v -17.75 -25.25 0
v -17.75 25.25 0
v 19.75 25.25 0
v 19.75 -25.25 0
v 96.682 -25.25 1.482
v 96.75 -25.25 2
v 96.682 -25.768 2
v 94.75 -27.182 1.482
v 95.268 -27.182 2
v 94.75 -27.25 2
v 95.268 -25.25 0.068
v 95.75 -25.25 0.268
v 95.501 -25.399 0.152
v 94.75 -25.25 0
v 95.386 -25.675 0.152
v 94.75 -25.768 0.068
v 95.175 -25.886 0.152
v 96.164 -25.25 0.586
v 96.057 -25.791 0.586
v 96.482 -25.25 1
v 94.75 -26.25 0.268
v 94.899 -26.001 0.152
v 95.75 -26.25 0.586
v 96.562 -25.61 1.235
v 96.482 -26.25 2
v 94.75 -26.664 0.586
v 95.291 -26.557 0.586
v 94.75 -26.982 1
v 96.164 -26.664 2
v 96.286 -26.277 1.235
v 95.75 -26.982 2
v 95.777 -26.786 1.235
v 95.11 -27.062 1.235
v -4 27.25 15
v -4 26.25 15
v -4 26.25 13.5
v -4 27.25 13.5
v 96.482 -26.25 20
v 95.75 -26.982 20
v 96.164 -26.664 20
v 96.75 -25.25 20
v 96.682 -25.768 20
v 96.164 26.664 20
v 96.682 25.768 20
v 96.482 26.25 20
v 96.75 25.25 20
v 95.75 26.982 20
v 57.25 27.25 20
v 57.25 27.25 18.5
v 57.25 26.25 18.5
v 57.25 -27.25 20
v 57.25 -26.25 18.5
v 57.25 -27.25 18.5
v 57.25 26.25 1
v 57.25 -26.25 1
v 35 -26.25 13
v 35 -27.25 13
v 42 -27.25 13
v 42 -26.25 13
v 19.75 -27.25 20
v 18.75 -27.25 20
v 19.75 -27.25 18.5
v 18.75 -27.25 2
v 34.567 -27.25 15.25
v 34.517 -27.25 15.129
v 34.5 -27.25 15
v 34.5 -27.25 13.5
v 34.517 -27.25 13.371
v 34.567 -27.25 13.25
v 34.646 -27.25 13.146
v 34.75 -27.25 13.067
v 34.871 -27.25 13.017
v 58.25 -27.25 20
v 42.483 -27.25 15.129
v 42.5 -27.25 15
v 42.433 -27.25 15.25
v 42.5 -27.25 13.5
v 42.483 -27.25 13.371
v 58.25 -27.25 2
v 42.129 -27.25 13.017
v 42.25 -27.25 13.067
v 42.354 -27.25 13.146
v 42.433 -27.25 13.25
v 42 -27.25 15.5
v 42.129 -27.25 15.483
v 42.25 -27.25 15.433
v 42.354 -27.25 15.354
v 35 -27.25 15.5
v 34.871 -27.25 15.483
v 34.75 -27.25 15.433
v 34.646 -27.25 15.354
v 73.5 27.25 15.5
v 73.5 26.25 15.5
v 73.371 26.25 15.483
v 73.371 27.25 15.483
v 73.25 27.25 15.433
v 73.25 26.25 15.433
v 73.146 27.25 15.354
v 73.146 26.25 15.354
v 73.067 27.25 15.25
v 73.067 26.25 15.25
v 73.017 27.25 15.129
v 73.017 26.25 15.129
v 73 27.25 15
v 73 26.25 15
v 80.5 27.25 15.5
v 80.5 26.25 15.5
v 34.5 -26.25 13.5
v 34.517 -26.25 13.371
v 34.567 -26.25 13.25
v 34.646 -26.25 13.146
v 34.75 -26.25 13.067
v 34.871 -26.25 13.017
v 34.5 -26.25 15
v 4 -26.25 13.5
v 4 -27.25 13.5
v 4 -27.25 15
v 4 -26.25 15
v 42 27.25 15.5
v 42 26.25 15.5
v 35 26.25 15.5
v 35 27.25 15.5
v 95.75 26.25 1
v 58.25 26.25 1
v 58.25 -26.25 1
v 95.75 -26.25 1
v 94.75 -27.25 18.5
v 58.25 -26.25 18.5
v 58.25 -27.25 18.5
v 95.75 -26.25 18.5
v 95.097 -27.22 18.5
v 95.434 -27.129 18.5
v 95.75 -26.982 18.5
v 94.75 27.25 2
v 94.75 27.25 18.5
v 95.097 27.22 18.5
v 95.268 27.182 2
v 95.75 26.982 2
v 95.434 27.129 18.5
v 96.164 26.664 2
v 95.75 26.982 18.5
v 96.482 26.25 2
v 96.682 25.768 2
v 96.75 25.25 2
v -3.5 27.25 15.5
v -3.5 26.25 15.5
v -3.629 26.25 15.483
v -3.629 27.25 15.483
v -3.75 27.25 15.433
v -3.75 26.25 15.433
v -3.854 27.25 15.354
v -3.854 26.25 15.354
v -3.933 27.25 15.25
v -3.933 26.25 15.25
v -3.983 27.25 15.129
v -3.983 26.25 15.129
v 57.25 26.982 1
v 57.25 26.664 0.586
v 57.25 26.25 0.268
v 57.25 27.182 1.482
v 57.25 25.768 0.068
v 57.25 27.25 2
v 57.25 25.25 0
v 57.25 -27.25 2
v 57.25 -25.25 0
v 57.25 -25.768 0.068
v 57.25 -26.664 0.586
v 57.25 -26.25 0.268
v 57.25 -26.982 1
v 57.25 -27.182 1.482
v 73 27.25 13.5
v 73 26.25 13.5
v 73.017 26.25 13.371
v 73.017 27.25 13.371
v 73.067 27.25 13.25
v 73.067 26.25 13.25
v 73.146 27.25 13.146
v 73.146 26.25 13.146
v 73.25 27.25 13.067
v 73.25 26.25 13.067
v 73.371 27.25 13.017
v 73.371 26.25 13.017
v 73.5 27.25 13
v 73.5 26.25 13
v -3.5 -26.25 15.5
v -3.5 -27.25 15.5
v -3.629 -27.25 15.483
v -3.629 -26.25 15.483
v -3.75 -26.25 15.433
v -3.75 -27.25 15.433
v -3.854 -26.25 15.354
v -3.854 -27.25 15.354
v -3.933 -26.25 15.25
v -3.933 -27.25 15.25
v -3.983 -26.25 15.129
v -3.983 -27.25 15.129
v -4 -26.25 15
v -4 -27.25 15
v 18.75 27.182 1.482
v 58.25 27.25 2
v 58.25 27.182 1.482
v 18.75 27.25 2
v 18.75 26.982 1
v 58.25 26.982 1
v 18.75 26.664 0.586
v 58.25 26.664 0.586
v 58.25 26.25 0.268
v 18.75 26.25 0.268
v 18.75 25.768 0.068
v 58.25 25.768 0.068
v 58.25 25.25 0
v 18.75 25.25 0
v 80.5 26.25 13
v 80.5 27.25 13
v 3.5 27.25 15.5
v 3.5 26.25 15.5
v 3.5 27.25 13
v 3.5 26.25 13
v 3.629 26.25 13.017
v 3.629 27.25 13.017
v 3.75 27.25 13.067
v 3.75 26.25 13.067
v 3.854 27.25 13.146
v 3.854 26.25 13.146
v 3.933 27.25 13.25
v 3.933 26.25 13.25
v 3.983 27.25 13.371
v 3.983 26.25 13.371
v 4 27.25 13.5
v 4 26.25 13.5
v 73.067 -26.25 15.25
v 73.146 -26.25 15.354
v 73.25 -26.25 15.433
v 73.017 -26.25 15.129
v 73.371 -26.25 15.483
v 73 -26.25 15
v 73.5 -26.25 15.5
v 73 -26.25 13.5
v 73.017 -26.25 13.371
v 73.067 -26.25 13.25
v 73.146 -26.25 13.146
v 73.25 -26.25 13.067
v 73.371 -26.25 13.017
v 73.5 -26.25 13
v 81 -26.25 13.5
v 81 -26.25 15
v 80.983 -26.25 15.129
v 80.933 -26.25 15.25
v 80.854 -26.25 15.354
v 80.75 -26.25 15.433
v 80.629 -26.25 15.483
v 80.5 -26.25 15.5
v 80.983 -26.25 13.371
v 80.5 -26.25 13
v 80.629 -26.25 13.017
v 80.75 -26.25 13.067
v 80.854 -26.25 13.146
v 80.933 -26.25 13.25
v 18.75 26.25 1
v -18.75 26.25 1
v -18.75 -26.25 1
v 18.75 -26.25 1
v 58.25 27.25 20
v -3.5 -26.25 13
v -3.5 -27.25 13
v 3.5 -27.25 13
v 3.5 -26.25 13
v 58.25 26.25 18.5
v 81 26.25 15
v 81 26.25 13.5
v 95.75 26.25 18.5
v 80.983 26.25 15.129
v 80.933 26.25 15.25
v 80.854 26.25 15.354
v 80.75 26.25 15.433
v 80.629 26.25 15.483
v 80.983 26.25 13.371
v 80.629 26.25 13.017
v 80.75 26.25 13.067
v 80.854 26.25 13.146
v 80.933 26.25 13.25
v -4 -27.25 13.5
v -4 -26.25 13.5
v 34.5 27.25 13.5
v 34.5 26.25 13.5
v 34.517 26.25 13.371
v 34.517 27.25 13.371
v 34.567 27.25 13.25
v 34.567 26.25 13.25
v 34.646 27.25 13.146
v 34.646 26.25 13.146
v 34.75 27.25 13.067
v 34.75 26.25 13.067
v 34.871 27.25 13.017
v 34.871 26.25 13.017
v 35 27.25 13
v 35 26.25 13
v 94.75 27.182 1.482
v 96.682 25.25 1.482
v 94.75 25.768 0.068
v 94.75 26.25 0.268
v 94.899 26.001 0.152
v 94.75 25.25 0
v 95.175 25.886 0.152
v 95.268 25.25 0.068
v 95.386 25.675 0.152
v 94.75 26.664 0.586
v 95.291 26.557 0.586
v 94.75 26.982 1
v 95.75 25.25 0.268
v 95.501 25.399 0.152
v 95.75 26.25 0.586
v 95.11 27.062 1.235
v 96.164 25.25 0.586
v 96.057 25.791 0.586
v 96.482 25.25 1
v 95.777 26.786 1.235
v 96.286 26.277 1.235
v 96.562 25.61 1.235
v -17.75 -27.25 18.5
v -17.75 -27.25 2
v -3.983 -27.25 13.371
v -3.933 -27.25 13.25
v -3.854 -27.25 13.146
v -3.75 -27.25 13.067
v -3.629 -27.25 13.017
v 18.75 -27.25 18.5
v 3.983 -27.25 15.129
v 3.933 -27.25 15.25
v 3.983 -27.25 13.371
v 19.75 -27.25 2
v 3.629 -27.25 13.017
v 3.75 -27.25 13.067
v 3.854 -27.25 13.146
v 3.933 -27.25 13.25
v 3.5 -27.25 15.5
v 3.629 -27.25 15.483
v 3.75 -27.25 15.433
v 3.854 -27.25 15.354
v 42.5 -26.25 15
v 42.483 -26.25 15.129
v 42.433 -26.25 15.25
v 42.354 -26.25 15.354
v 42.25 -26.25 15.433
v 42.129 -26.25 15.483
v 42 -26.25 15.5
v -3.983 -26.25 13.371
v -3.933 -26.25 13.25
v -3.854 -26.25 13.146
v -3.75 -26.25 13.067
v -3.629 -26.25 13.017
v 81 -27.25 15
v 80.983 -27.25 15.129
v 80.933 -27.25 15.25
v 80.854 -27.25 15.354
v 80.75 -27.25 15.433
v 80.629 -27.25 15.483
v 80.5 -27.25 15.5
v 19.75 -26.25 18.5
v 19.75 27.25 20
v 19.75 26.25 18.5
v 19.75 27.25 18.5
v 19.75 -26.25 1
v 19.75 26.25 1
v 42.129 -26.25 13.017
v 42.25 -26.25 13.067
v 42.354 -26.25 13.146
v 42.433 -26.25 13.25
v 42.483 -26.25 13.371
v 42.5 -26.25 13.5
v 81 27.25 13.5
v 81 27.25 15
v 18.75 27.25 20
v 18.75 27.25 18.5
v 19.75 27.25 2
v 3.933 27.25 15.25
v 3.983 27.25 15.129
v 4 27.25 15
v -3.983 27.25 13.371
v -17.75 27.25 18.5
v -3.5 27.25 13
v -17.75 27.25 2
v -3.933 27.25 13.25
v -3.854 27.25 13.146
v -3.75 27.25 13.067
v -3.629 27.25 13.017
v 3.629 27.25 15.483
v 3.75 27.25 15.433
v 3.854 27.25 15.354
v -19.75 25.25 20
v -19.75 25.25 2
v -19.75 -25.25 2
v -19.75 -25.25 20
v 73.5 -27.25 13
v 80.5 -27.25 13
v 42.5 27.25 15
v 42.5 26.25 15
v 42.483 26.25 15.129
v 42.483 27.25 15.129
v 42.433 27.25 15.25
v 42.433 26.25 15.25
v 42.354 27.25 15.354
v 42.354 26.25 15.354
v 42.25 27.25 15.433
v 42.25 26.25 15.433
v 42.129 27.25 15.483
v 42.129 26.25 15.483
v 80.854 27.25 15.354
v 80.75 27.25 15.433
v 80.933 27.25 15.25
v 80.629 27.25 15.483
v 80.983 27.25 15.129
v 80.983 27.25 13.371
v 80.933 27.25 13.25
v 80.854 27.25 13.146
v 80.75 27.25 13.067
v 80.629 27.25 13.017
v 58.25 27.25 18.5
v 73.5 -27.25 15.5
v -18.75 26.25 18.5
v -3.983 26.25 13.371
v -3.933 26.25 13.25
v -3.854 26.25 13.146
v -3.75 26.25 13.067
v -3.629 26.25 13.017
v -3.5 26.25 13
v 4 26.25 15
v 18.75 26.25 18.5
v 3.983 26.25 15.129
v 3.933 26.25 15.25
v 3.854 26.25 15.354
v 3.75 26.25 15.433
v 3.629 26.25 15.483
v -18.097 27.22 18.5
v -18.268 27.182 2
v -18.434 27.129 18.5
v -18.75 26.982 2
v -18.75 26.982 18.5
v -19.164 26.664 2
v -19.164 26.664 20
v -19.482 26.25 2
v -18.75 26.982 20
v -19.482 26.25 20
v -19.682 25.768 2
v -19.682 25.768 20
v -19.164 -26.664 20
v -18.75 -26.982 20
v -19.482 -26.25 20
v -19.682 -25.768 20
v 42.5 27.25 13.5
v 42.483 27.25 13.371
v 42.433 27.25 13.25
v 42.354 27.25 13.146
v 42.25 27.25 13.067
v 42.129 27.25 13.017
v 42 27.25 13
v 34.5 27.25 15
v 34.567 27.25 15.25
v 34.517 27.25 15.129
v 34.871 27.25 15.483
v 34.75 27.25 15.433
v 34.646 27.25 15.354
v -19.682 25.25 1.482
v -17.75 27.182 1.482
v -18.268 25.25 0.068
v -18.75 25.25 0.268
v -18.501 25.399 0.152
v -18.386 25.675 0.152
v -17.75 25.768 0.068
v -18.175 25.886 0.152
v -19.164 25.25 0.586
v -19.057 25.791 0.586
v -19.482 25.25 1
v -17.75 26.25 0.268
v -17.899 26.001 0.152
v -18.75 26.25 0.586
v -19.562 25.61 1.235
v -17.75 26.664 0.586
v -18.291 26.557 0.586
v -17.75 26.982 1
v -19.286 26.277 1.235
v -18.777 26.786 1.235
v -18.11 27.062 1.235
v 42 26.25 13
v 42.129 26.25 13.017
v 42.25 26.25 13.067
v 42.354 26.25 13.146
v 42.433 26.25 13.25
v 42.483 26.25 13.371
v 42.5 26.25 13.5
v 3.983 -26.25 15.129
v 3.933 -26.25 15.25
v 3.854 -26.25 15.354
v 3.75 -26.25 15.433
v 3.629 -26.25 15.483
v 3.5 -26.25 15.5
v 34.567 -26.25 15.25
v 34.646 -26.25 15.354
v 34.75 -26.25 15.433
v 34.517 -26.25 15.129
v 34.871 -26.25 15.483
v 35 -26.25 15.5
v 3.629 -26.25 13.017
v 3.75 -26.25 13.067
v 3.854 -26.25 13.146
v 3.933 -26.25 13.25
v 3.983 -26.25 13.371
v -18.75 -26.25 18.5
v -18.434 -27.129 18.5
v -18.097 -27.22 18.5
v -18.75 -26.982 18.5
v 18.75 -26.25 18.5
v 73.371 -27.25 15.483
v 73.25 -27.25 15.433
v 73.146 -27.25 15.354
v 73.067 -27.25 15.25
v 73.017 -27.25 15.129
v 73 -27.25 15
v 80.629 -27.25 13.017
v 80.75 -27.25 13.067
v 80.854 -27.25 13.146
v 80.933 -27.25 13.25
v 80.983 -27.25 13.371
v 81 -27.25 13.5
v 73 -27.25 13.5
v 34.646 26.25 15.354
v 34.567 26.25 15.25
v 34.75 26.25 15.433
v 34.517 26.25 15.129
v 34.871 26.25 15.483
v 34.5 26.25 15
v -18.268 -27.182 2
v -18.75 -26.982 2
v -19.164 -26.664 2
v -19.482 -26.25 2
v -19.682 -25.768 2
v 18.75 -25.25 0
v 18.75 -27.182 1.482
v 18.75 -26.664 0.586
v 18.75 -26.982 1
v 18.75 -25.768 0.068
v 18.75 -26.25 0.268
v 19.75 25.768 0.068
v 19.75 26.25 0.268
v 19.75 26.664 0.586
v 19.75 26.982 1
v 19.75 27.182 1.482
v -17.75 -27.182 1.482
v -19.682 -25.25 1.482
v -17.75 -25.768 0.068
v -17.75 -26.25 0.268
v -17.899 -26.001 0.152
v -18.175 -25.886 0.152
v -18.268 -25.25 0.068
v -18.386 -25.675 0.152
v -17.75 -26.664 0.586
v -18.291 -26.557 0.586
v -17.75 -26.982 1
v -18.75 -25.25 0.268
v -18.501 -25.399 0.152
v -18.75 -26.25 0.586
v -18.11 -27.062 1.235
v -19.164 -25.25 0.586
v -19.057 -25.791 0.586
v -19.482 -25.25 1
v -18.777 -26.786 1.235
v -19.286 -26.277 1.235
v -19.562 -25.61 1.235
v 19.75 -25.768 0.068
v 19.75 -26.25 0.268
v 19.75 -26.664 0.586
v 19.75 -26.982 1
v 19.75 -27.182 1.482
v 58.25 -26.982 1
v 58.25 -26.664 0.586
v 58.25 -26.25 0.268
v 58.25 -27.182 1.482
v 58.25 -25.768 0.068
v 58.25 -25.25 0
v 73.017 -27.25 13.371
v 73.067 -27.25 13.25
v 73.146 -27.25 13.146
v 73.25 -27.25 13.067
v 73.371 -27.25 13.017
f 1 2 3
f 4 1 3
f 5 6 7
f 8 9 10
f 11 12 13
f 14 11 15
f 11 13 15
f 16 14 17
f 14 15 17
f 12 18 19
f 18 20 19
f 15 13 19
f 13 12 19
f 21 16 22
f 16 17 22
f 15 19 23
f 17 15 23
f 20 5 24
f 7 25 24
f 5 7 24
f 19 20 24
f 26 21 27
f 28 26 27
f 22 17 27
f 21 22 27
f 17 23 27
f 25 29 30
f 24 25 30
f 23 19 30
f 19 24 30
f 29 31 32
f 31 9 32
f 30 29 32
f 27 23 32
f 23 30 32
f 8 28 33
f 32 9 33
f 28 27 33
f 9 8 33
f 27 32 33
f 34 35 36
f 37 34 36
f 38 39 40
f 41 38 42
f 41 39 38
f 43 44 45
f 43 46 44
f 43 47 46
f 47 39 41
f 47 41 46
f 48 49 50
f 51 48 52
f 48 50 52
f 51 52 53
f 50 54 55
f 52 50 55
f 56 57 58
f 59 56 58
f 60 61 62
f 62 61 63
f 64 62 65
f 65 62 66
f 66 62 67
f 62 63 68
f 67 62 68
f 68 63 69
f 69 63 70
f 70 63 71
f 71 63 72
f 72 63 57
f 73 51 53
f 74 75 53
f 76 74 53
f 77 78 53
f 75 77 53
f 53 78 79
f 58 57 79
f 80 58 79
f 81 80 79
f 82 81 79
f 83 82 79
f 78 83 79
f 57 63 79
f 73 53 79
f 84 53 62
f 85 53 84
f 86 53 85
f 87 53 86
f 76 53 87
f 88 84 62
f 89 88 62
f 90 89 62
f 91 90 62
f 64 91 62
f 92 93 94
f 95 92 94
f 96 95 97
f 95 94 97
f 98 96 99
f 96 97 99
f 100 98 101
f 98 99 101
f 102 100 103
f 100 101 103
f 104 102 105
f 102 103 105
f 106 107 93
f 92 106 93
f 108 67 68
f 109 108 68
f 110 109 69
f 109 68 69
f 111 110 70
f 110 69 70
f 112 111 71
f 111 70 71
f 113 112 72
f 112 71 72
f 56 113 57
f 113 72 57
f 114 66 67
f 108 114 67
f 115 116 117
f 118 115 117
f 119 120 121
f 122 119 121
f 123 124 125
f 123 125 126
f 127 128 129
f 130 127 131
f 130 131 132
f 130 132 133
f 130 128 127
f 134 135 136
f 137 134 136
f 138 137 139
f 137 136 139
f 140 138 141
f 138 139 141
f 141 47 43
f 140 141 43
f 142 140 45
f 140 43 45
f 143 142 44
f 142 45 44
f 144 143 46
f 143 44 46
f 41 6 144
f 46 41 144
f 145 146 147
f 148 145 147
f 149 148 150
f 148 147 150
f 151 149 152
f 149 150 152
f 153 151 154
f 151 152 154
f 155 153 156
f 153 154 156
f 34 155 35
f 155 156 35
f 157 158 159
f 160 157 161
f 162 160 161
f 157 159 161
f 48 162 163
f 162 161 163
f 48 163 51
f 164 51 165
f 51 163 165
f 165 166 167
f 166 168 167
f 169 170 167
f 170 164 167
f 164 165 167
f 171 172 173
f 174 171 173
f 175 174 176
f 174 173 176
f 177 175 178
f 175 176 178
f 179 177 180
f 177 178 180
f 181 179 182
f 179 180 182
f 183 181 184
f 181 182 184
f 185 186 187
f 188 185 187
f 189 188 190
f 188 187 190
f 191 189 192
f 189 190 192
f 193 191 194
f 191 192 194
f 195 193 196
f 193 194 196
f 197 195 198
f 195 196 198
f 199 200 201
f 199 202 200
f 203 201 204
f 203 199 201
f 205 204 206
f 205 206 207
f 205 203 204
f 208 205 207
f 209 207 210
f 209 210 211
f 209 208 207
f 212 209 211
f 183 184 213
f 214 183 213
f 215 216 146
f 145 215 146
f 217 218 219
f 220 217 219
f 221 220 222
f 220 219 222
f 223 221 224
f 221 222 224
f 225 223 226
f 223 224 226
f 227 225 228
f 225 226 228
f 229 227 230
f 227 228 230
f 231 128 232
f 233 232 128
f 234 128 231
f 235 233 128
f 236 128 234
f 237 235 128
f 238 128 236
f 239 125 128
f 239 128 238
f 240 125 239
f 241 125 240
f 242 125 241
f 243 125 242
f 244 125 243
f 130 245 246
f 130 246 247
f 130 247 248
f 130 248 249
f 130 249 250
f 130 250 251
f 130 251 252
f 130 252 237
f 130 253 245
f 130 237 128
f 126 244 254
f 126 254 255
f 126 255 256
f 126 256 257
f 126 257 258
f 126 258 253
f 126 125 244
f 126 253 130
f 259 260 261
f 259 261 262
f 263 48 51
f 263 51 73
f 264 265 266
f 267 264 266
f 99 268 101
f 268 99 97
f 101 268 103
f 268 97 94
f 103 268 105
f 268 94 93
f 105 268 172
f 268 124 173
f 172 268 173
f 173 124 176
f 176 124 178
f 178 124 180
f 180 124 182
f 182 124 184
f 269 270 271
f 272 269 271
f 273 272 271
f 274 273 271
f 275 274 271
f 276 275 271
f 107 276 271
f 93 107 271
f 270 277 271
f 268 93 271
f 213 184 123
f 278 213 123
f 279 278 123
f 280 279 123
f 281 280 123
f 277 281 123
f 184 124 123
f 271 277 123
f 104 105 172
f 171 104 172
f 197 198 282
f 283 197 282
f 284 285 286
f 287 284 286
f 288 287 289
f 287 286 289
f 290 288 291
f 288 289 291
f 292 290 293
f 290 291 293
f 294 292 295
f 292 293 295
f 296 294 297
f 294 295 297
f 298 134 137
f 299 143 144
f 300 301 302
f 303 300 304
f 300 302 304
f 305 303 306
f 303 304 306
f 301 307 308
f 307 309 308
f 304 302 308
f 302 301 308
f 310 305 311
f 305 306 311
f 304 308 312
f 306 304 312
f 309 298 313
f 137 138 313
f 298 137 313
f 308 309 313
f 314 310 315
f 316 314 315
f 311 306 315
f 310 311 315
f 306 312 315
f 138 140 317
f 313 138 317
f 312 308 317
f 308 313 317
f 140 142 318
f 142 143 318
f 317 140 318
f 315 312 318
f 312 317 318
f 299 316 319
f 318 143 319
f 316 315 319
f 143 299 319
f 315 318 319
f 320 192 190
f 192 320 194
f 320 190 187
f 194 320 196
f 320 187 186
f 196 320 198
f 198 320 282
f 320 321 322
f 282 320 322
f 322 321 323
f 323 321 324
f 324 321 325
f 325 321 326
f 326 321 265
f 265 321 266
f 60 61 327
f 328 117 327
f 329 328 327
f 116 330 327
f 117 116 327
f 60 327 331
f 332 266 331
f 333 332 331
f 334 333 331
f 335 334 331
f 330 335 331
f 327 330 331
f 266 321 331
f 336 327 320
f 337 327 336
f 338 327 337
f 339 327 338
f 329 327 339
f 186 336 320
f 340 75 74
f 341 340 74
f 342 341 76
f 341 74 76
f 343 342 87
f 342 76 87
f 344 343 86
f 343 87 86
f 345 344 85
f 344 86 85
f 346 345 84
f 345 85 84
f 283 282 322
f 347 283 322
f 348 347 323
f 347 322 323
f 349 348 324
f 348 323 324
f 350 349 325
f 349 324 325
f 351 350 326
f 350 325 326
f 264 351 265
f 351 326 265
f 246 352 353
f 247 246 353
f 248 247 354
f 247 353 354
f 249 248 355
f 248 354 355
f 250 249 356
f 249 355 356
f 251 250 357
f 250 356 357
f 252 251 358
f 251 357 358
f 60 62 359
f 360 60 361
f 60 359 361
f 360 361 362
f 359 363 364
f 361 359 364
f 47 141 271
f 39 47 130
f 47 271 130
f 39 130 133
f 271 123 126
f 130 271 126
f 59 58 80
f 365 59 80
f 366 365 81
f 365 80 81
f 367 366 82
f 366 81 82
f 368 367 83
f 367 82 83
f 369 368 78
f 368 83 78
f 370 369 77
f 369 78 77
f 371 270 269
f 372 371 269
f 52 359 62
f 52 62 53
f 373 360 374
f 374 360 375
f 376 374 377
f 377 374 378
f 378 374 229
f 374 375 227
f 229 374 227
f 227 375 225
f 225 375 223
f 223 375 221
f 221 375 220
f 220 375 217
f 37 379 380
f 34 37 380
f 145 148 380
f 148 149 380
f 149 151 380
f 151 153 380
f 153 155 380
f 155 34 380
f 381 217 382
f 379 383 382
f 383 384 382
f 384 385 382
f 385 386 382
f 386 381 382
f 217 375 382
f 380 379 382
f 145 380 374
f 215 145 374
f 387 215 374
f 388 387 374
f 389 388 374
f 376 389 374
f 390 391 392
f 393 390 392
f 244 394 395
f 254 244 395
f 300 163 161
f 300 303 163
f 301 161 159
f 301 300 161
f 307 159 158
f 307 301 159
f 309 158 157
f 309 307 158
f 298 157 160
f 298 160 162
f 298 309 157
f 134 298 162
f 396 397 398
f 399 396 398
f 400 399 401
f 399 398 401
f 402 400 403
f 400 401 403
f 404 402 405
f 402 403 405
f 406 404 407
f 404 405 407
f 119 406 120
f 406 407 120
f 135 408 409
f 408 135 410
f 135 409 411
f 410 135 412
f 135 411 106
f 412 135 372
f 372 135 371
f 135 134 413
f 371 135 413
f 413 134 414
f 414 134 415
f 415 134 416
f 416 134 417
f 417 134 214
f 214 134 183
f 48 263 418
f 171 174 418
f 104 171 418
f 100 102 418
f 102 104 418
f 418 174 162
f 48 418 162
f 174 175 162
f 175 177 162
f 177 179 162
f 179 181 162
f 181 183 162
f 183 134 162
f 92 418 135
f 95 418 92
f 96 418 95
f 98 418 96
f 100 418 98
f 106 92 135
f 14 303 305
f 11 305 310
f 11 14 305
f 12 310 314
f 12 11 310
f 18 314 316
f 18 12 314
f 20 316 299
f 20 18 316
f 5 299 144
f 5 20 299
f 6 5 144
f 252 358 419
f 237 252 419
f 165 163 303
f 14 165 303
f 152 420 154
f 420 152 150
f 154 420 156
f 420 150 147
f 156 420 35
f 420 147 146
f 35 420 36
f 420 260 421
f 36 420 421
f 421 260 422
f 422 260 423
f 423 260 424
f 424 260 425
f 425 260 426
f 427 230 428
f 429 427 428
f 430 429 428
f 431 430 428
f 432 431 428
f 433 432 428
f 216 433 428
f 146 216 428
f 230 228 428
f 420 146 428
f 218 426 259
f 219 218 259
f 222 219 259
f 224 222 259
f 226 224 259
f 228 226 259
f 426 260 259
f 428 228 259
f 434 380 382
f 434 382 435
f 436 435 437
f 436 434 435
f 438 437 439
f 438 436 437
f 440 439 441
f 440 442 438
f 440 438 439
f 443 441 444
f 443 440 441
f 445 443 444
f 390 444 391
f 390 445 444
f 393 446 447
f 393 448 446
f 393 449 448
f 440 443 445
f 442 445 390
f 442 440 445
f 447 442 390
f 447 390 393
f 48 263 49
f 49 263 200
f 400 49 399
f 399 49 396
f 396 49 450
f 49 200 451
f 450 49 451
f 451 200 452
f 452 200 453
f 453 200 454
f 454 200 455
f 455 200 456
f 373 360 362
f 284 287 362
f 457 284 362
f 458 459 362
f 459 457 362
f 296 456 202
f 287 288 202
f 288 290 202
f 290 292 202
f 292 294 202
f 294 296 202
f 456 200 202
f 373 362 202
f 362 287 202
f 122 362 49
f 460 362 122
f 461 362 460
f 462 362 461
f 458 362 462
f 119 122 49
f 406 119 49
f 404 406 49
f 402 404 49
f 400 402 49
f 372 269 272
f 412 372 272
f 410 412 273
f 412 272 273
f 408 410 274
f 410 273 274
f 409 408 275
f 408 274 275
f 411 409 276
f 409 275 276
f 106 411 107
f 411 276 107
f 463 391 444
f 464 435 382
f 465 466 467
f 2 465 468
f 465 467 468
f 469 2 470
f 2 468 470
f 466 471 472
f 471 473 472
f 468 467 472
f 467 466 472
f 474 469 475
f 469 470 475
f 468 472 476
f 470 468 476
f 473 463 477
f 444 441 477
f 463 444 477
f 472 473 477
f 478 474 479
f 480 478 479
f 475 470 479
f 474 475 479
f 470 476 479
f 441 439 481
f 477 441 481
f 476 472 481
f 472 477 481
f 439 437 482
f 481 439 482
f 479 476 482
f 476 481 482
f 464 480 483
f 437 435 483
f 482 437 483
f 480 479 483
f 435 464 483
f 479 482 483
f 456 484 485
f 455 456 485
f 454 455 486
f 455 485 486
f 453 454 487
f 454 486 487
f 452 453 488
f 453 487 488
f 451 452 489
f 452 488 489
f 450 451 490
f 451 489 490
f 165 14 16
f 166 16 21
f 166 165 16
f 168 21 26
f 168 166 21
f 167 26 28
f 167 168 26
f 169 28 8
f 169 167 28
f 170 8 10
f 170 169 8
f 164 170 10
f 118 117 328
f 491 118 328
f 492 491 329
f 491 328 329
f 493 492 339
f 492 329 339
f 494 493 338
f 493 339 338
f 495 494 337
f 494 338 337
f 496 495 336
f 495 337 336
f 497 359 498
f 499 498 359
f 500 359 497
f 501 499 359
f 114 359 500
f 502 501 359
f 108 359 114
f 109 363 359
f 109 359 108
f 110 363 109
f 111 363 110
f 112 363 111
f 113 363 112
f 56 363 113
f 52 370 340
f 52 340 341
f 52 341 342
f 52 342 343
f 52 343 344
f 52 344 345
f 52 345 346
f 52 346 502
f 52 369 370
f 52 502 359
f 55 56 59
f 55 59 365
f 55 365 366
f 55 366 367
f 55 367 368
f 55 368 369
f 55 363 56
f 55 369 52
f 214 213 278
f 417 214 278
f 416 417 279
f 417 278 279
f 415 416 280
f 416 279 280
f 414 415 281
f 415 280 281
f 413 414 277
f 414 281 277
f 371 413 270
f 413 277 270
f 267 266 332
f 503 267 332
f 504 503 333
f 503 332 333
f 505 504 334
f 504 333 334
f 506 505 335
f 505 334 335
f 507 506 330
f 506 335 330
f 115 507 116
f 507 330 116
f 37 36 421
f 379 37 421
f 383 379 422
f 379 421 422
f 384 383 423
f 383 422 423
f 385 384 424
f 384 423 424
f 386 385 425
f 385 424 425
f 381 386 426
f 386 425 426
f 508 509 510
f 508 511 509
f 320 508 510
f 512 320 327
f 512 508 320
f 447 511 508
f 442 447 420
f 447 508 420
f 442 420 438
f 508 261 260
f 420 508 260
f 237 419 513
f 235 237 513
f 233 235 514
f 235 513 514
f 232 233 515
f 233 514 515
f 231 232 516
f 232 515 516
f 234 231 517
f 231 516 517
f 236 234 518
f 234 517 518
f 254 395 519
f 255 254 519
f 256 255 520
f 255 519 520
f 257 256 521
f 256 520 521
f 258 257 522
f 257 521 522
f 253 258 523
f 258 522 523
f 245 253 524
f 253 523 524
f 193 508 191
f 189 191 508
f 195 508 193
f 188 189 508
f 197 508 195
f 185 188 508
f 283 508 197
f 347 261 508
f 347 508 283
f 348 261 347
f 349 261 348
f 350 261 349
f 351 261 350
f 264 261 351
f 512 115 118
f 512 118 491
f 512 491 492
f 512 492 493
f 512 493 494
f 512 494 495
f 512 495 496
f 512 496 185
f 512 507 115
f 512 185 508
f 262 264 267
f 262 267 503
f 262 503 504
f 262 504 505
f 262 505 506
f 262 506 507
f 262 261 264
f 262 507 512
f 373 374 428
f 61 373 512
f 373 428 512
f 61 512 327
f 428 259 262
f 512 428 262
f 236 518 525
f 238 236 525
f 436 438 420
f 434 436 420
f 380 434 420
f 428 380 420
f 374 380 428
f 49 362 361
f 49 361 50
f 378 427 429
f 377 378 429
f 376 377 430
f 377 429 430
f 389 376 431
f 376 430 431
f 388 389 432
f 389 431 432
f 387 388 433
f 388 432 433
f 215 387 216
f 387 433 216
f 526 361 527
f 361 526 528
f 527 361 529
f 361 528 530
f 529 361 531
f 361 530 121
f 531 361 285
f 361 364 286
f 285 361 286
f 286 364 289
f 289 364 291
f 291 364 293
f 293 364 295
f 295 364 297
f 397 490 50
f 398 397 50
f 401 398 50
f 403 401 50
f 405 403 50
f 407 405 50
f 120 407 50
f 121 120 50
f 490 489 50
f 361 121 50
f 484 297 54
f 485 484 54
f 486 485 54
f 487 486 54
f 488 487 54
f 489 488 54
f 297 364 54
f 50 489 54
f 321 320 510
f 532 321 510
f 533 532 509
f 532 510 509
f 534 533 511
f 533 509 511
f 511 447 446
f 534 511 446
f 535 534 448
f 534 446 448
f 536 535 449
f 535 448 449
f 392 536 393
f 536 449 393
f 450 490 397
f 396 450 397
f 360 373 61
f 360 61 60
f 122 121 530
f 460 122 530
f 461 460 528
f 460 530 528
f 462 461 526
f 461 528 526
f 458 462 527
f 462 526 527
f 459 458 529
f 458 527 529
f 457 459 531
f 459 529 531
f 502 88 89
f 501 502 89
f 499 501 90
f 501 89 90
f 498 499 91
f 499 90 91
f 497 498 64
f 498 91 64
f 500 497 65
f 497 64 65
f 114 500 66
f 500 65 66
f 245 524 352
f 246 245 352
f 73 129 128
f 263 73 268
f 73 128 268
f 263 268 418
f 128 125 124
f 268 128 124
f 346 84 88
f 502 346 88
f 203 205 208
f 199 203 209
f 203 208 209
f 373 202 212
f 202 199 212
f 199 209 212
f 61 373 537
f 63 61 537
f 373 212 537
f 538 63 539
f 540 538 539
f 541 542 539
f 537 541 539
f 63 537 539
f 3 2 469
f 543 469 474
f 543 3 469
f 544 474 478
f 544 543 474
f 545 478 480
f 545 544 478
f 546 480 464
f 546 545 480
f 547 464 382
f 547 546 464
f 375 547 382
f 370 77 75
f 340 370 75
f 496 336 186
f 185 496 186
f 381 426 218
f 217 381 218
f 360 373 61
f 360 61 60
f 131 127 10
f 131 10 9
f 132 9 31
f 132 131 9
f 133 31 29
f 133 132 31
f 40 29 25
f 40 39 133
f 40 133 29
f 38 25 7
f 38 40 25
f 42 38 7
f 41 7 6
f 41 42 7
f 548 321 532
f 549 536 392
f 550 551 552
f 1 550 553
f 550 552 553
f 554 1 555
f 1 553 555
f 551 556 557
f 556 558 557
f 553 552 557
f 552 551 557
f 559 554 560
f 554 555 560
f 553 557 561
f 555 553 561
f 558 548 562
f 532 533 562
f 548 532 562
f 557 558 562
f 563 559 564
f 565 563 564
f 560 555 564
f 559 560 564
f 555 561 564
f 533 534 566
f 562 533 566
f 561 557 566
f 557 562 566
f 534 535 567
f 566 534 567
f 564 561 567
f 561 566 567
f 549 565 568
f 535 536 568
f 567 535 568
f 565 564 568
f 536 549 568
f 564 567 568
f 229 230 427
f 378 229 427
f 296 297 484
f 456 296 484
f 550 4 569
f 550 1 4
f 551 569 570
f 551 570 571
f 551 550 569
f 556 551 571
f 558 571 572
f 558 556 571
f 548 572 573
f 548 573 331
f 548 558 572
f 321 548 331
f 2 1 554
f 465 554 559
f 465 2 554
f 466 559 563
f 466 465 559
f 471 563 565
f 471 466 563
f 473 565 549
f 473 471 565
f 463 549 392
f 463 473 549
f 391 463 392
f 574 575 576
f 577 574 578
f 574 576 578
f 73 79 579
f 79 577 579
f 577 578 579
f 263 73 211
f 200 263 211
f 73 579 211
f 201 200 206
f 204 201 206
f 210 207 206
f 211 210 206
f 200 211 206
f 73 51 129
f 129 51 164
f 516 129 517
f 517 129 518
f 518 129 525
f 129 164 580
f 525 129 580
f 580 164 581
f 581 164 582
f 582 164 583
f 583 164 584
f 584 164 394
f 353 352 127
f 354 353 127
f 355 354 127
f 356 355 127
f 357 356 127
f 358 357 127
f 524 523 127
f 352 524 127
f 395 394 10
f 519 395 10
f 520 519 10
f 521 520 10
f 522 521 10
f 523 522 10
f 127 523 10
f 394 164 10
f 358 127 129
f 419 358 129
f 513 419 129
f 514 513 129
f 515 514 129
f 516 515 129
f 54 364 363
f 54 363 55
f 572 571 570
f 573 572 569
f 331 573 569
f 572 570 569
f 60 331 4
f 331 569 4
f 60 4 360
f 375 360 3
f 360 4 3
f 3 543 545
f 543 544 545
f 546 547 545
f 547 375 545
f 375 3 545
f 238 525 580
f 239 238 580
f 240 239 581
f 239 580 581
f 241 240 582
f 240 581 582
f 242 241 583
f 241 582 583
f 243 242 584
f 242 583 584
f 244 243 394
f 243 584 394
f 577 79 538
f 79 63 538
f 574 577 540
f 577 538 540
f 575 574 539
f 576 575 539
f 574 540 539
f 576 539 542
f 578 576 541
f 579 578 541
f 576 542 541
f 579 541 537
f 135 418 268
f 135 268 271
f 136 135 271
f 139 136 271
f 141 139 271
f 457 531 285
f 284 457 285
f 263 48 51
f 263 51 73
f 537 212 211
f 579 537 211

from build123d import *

# Parameters (mm, degrees)
F0_W     = 37.5
F0_H     = 52.5
F1_DEPTH = 1
F0_H_2   = 1
F2_DEPTH = 18.5
F4_DEPTH = 60
F5_DEPTH = 20
F8_R     = 2
F8_2_R   = 2
F9_R     = 2
F9_2_R   = 2
F9_3_R   = 2


with BuildPart() as f1:
    # F0 (on Top) → F1 (new body)
    with BuildSketch(Plane.XY):
        Rectangle(F0_W, F0_H)
    extrude(amount=F1_DEPTH)

    # F0 (on Top) → F2 (join)
    with BuildSketch(Plane.XY):
        with Locations((0, 26.75)):
            Rectangle(F0_W, F0_H_2)
        with Locations((0, -26.75)):
            Rectangle(F0_W, F0_H_2)
    extrude(amount=F2_DEPTH)

    # F3 (on face) → F4 (cut)
    with BuildSketch(Plane.XZ.offset(27.25)):
        with BuildLine():
            ThreePointArc((4, 15), (3.8535533906, 15.3535533906), (3.5, 15.5))
            Line((3.5, 15.5), (-3.5, 15.5))
            ThreePointArc((-3.5, 15.5), (-3.8535533906, 15.3535533906), (-4, 15))
            Line((-4, 15), (-4, 13.5))
            ThreePointArc((-4, 13.5), (-3.8535533906, 13.1464466094), (-3.5, 13))
            Line((-3.5, 13), (3.5, 13))
            ThreePointArc((3.5, 13), (3.8535533906, 13.1464466094), (4, 13.5))
            Line((4, 13.5), (4, 15))
        make_face()
    extrude(amount=-F4_DEPTH, mode=Mode.SUBTRACT)

    # F0 (on Top) → F5 (join)
    with BuildSketch(Plane.XY):
        Polygon((-18.75, -26.25), (-18.75, 26.25), (-18.75, 27.25), (-19.75, 27.25), (-19.75, -27.25), (-18.75, -27.25), align=None)
        Polygon((18.75, 27.25), (18.75, 26.25), (18.75, -26.25), (18.75, -27.25), (19.75, -27.25), (19.75, 27.25), align=None)
    extrude(amount=F5_DEPTH)


with BuildPart() as f6_1:
    # F6: copy of F1
    add(f1.part.moved(Location((38.4999997914, 0, 0))))


with BuildPart() as f7_1:
    # F7: copy of F6_1
    add(f6_1.part.moved(Location((38.5, 0, 0))))

    # F8#2
    f8_2_edges = [f7_1.edges().sort_by_distance(p)[0] for p in [
        (96.75, -27.25, 10),
        (96.75, 27.25, 10),
    ]]
    fillet(f8_2_edges, radius=F8_2_R)

    # F9#3
    f9_3_edges = [f7_1.edges().sort_by_distance(p)[0] for p in [
        (76, -27.25, 0),
    ]]
    fillet(f9_3_edges, radius=F9_3_R)


with BuildPart() as f1_1:
    add(f1.part)

    # F8
    f8_edges = [f1_1.edges().sort_by_distance(p)[0] for p in [
        (-19.75, -27.25, 10),
        (-19.75, 27.25, 10),
    ]]
    fillet(f8_edges, radius=F8_R)

    # F9
    f9_edges = [f1_1.edges().sort_by_distance(p)[0] for p in [
        (1, -27.25, 0),
        (-19.75, 0, 0),
    ]]
    fillet(f9_edges, radius=F9_R)


with BuildPart() as f6_1_1:
    add(f6_1.part)

    # F9#2
    f9_2_edges = [f6_1_1.edges().sort_by_distance(p)[0] for p in [
        (38.5, -27.25, 0),
        (38.5, 27.25, 0),
    ]]
    fillet(f9_2_edges, radius=F9_2_R)


solid = Compound([f7_1.part, f1_1.part, f6_1_1.part])
